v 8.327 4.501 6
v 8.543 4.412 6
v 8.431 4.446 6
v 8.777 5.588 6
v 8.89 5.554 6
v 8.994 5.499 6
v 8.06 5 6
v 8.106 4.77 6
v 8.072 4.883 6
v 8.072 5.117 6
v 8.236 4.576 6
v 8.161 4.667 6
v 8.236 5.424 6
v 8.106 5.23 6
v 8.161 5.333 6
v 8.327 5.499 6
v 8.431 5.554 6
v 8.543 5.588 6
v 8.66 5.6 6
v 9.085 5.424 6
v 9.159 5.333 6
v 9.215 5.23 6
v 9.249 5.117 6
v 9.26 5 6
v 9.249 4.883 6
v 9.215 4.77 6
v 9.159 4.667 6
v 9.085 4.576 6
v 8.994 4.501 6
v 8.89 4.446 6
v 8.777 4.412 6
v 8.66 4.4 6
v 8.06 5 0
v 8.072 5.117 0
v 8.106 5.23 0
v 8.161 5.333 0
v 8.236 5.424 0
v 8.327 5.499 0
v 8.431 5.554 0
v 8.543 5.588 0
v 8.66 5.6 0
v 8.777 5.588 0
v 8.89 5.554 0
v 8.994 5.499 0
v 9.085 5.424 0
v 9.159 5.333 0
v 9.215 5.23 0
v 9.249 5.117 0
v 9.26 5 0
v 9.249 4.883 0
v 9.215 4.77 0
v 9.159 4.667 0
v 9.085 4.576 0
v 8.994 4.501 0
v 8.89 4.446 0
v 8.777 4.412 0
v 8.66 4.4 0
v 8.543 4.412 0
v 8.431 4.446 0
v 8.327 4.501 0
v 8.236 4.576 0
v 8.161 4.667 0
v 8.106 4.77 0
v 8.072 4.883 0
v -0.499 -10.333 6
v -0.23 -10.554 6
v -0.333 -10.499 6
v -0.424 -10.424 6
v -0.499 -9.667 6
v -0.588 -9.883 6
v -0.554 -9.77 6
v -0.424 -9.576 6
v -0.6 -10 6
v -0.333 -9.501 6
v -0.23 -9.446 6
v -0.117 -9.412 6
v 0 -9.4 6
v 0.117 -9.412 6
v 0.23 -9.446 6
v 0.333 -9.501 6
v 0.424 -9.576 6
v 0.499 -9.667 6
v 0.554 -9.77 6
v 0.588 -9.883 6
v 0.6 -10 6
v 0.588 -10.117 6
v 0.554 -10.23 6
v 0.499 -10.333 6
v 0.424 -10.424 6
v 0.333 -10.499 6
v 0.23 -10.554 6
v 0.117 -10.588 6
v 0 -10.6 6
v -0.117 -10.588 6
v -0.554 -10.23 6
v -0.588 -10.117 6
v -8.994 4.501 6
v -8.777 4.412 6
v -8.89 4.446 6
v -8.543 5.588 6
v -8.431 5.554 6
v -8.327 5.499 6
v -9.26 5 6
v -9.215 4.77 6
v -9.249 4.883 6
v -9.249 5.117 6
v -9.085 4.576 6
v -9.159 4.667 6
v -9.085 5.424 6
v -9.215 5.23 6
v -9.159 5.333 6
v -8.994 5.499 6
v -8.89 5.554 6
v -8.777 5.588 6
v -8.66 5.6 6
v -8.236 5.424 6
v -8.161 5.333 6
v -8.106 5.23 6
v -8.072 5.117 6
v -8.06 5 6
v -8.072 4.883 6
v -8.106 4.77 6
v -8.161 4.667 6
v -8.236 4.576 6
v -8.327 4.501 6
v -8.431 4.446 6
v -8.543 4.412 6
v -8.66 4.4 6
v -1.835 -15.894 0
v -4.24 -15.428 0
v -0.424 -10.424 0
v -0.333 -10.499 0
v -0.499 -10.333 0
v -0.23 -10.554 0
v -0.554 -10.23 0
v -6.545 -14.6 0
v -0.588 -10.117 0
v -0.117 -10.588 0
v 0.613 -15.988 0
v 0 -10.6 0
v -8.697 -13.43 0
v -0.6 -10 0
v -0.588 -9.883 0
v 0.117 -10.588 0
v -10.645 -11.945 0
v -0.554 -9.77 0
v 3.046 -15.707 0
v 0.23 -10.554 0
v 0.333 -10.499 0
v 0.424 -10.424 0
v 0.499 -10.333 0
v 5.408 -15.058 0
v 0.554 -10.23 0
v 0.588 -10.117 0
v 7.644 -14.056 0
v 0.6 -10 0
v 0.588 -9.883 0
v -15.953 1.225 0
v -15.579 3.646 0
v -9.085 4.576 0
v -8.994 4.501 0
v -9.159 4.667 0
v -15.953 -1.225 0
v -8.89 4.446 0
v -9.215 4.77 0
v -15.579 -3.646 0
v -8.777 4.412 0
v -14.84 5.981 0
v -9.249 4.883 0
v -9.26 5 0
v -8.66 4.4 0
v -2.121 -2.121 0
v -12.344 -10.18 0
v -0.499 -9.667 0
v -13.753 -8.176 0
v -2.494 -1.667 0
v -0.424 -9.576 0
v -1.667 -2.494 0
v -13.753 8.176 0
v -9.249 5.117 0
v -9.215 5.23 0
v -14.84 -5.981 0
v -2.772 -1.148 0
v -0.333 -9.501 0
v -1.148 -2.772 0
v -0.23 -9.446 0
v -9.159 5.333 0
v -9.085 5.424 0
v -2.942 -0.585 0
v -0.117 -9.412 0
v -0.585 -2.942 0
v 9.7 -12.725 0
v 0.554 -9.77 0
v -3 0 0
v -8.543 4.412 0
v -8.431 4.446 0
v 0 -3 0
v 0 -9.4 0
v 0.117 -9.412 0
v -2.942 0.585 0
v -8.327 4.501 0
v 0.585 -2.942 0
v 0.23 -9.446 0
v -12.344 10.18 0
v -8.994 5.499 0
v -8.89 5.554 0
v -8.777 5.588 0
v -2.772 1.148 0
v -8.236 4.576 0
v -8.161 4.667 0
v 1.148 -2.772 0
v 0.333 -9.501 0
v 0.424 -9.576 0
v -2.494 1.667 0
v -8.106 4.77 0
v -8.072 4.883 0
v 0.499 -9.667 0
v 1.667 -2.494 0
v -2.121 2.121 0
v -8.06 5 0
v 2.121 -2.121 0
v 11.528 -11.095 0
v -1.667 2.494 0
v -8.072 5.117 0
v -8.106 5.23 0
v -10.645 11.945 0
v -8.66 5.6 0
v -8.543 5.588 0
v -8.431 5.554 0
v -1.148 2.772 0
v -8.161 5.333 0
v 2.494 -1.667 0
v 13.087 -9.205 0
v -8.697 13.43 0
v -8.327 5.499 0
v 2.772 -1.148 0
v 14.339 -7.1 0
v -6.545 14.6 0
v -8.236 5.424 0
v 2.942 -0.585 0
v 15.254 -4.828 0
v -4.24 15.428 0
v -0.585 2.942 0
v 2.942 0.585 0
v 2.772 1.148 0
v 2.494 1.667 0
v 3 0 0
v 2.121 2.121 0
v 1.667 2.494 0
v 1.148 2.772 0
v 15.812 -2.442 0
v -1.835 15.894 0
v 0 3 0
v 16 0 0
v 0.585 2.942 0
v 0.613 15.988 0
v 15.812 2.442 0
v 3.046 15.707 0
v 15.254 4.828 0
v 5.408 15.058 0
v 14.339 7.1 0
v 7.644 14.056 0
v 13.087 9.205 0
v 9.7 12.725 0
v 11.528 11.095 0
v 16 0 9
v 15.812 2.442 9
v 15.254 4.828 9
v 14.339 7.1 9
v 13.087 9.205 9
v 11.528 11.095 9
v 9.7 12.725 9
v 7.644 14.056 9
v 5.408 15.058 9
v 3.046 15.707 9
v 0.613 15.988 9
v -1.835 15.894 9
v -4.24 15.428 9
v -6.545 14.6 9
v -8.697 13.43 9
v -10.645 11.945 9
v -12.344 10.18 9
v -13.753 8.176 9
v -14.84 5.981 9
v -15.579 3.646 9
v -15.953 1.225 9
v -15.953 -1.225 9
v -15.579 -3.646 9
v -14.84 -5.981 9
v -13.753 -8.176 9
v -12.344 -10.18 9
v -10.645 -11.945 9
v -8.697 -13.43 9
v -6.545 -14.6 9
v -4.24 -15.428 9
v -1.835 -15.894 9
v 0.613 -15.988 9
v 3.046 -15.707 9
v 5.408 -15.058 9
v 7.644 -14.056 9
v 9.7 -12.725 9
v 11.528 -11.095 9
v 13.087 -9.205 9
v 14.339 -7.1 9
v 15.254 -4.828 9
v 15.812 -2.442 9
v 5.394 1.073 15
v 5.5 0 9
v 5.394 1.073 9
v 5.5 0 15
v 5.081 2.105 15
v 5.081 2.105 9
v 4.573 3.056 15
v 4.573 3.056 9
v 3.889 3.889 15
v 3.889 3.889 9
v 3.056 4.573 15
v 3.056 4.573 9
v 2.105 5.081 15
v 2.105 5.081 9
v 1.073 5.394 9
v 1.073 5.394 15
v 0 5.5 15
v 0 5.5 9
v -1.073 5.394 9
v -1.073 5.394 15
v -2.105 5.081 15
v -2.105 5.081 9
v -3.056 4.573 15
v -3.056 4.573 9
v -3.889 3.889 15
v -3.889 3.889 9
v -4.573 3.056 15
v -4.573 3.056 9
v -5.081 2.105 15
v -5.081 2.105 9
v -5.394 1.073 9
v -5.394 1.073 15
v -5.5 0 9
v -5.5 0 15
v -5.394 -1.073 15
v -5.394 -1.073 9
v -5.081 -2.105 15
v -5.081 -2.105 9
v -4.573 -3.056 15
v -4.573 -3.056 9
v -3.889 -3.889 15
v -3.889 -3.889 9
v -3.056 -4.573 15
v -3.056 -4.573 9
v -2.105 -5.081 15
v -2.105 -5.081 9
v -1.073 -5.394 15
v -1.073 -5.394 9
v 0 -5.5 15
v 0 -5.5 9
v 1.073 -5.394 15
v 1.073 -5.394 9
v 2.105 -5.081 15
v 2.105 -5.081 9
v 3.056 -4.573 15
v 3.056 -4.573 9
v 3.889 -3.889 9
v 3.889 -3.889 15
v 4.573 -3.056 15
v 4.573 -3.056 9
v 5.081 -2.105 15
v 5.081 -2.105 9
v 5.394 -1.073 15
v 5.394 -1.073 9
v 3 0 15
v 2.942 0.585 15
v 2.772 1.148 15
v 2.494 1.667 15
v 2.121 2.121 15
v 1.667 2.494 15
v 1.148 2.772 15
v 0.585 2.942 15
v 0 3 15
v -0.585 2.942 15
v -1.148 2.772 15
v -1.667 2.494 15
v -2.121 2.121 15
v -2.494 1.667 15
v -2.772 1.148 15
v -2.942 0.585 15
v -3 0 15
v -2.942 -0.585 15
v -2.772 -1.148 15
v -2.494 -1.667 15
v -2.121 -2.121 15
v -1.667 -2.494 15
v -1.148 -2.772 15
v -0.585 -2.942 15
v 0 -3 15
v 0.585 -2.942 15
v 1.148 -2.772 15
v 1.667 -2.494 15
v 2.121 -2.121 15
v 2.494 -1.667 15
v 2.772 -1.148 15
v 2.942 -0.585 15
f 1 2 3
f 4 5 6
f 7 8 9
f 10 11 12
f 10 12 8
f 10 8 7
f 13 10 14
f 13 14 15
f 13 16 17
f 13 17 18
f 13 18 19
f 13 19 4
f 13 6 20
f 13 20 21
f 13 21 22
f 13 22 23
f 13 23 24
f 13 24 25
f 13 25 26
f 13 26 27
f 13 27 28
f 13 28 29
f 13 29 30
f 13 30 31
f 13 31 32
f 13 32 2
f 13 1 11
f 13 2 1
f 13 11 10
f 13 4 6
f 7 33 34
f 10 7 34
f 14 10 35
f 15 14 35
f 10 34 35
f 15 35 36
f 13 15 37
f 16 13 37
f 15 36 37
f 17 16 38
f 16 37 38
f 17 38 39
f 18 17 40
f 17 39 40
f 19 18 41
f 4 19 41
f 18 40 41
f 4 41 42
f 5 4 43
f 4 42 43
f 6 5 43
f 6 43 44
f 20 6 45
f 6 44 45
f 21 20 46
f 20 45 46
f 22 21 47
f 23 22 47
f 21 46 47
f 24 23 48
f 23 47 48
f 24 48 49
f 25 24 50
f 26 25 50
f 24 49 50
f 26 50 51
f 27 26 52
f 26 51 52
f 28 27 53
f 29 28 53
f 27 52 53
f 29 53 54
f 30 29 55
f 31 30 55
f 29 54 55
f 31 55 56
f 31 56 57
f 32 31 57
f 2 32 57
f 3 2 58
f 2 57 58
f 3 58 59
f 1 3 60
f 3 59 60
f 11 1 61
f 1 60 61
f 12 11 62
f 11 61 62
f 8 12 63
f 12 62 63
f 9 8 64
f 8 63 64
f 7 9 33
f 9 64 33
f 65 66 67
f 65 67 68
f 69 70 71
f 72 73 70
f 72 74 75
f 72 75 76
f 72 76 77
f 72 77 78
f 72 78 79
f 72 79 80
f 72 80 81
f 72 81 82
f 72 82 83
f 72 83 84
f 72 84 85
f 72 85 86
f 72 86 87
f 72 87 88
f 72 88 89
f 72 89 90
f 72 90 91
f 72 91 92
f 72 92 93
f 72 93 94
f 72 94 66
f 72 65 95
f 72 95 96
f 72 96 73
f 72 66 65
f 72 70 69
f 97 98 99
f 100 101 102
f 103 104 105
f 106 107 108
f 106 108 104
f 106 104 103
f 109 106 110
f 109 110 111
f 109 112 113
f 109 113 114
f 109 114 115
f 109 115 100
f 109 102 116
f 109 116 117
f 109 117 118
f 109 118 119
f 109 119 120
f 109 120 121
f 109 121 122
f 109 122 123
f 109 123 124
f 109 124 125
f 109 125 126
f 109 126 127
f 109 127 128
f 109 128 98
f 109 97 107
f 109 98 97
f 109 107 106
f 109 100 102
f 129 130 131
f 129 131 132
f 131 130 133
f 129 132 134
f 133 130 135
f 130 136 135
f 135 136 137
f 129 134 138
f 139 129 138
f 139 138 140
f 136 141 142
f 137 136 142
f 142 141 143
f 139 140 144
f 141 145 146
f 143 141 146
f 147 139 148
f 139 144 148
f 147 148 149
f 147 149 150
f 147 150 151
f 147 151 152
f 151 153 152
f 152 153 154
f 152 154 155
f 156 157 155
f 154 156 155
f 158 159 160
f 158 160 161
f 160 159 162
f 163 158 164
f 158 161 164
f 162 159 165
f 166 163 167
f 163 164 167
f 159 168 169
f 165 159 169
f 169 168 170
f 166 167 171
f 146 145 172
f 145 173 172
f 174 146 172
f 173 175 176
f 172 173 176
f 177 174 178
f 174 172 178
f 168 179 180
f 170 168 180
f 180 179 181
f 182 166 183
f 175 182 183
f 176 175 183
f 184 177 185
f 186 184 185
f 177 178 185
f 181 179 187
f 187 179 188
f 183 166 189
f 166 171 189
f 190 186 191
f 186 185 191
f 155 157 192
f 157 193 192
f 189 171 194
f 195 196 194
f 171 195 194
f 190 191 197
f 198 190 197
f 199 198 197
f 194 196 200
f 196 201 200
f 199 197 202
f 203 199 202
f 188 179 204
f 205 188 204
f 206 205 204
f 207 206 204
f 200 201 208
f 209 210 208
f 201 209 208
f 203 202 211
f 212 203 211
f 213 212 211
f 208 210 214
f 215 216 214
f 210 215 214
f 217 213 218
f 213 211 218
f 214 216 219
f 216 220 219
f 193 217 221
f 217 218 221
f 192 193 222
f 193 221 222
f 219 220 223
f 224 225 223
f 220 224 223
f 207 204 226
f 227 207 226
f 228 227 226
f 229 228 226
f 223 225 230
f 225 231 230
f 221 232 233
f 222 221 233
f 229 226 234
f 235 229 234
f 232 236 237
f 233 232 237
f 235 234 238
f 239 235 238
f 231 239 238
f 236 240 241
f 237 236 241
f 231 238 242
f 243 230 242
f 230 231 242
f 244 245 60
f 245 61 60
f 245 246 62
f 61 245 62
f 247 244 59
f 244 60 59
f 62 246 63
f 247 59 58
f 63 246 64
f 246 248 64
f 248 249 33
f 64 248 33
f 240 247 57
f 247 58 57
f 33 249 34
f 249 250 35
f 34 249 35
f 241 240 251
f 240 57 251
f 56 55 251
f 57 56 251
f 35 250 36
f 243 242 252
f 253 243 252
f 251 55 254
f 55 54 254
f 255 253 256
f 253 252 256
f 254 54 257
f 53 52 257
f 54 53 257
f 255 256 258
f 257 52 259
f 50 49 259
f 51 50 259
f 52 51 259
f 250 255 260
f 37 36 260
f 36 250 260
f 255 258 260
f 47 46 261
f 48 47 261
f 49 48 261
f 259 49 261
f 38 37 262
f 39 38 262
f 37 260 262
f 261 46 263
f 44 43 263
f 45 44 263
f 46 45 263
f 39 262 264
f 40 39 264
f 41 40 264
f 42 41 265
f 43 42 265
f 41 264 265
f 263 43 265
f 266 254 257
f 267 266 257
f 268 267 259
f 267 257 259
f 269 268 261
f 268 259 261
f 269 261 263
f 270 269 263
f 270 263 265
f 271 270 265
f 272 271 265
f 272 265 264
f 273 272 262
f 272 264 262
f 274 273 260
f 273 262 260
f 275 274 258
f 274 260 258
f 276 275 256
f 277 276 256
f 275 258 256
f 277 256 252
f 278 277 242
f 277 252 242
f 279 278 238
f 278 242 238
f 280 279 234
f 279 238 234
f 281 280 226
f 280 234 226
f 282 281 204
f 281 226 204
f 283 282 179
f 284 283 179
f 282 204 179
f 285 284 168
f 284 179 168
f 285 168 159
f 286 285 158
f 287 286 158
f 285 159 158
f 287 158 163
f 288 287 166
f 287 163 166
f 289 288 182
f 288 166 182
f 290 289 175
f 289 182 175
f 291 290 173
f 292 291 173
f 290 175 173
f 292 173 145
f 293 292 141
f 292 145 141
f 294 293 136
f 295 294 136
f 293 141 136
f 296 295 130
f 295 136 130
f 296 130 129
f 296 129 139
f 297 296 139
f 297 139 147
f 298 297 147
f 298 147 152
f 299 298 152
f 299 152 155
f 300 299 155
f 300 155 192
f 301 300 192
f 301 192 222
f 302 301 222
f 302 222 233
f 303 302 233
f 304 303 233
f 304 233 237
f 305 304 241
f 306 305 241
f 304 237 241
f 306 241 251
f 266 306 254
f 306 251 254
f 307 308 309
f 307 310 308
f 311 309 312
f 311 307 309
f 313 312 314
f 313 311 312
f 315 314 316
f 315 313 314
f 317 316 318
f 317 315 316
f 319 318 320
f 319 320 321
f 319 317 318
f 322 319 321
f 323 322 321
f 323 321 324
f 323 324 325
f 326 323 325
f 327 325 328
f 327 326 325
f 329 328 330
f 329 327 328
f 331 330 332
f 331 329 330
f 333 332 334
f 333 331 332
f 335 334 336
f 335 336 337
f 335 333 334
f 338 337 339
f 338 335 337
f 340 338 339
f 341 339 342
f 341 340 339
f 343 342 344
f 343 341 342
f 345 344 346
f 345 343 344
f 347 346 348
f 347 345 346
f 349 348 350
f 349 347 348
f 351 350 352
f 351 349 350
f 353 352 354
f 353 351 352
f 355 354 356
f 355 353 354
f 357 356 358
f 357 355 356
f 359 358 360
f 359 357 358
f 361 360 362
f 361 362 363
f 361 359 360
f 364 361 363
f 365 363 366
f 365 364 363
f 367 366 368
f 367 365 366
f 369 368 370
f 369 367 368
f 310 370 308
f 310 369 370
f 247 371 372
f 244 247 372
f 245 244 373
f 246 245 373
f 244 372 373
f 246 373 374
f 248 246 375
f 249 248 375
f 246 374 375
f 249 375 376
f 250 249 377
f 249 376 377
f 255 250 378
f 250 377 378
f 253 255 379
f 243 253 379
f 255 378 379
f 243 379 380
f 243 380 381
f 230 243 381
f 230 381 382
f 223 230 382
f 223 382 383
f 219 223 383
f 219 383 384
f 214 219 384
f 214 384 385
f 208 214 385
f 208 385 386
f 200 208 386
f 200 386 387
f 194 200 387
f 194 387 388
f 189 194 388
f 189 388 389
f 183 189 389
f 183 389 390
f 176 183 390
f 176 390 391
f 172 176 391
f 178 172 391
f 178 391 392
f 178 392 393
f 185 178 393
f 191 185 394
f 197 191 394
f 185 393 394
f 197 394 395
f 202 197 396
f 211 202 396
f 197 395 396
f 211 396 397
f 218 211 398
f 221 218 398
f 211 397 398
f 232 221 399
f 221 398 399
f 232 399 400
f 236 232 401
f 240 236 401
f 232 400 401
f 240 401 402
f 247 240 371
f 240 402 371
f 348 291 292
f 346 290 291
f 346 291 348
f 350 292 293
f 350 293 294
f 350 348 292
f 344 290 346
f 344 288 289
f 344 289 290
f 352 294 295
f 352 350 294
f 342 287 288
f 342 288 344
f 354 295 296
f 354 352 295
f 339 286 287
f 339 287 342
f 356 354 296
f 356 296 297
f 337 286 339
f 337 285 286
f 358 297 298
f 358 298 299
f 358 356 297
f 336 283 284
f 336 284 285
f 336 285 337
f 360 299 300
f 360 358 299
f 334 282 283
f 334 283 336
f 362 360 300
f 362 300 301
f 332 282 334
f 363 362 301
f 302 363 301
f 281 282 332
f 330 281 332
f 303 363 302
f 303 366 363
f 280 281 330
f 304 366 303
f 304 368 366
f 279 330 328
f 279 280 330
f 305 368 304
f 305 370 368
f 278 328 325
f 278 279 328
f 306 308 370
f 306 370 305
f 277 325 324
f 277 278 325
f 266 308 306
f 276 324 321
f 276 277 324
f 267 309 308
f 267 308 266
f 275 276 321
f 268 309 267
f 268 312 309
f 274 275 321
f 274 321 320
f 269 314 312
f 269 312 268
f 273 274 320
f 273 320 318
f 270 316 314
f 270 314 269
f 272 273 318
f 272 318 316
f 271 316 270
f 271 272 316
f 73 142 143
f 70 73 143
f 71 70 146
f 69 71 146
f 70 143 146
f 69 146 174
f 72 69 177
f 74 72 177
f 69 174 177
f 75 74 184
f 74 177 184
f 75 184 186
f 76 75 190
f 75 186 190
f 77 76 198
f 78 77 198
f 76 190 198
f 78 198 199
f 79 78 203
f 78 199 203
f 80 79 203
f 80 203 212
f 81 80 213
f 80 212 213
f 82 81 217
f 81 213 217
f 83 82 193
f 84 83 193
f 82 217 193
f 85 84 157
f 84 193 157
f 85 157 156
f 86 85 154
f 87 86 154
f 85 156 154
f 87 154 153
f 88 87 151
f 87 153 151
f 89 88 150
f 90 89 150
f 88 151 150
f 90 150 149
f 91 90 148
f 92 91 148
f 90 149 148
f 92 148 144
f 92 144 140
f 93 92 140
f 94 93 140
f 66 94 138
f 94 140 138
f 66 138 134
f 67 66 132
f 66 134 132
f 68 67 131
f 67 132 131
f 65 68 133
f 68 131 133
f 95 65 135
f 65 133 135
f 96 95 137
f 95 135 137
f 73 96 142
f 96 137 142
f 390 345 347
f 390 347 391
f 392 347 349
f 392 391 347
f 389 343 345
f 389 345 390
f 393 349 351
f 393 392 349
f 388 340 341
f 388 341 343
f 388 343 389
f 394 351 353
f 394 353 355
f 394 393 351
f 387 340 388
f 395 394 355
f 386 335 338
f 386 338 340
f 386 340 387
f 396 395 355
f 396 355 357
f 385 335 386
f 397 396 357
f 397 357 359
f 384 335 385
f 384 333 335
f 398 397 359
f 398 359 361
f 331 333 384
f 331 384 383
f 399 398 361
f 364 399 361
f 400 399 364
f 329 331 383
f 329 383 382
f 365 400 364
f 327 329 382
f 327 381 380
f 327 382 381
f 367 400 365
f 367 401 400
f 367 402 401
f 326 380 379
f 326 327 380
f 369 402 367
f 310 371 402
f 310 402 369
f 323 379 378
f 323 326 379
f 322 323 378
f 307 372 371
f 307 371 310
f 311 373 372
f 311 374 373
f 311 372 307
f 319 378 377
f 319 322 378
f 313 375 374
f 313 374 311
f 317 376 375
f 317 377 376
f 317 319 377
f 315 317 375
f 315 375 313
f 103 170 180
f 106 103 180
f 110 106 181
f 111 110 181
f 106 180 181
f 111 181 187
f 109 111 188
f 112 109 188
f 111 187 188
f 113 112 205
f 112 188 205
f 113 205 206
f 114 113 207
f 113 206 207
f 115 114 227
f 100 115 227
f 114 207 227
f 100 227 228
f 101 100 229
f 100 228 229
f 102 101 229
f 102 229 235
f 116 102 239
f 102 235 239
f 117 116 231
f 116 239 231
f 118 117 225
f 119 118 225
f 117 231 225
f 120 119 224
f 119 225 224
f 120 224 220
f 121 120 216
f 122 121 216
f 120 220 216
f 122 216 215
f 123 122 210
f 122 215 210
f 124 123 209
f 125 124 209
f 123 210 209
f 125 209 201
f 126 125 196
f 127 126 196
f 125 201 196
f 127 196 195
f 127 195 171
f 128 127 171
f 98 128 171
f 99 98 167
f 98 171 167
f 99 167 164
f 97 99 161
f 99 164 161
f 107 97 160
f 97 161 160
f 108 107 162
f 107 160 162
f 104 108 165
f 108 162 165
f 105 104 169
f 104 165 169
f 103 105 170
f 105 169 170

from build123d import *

# Parameters (mm, degrees)
SKETCH_1_R          = 16
EXTRUDE_1_DEPTH     = 9
SKETCH_2_R          = 6
EXTRUDE_2_DEPTH     = 0.5
SKETCH_3_R          = 16
EXTRUDE_3_DEPTH     = 3.25
SKETCH_4_R          = 5.5
EXTRUDE_4_DEPTH     = 2.25
SKETCH_5_R          = 3
CUT_EXTRUDE_1_DEPTH = 26.25
SKETCH_6_R          = 8
SKETCH_6_R_2        = 5.5
CUT_EXTRUDE_2_DEPTH = 2.25
SKETCH_7_R          = 0.6
CUT_EXTRUDE_3_DEPTH = 6
SKETCH_8_R          = 0.6
CUT_EXTRUDE_4_DEPTH = 3
SKETCH_9_R          = 18.290801542
SKETCH_9_R_2        = 5.5
CUT_EXTRUDE_5_DEPTH = 3.75


with BuildPart() as part:
    # 草图1 → 凸台-拉伸1 (new body)
    with BuildSketch(Plane.XY):
        Circle(SKETCH_1_R)
    extrude(amount=EXTRUDE_1_DEPTH)

    # 草图2 → 凸台-拉伸2 (add)
    with BuildSketch(Plane.XY.offset(9)):
        Circle(SKETCH_2_R)
    extrude(amount=EXTRUDE_2_DEPTH)

    # 草图3 → 凸台-拉伸3 (add)
    with BuildSketch(Plane.XY.offset(9.5)):
        Circle(SKETCH_3_R)
    extrude(amount=EXTRUDE_3_DEPTH)

    # 草图4 → 凸台-拉伸4 (add)
    with BuildSketch(Plane.XY.offset(12.75)):
        Circle(SKETCH_4_R)
    extrude(amount=EXTRUDE_4_DEPTH)

    # 草图5 → 切除-拉伸1 (cut)
    with BuildSketch(Plane.XY.offset(15)):
        Circle(SKETCH_5_R)
    extrude(amount=-CUT_EXTRUDE_1_DEPTH, mode=Mode.SUBTRACT)

    # 草图6 → 切除-拉伸2 (cut)
    with BuildSketch(Plane.XY.offset(12.75)):
        Circle(SKETCH_6_R)
        Circle(SKETCH_6_R_2, mode=Mode.SUBTRACT)
    extrude(amount=-CUT_EXTRUDE_2_DEPTH, mode=Mode.SUBTRACT)

    # 草图7 → 切除-拉伸3 (cut)
    with BuildSketch(Plane(origin=(0, 0, 0), x_dir=(-1, 0, 0), z_dir=(0, 0, -1))):
        with Locations((8.660254038, 5)):
            Circle(SKETCH_7_R)
        with Locations((-8.660254038, 5)):
            Circle(SKETCH_7_R)
        with Locations((0, -10)):
            Circle(SKETCH_7_R)
    extrude(amount=-CUT_EXTRUDE_3_DEPTH, mode=Mode.SUBTRACT)

    # 草图8 → 切除-拉伸4 (cut)
    with BuildSketch(Plane.XY.offset(12.75)):
        with Locations((5, -8.660254038)):
            Circle(SKETCH_8_R)
        with Locations((5, 8.660254038)):
            Circle(SKETCH_8_R)
        with Locations((-10, 0)):
            Circle(SKETCH_8_R)
    extrude(amount=-CUT_EXTRUDE_4_DEPTH, mode=Mode.SUBTRACT)

    # 草图9 → 切除-拉伸5 (cut)
    with BuildSketch(Plane.XY.offset(12.75)):
        Circle(SKETCH_9_R)
        Circle(SKETCH_9_R_2, mode=Mode.SUBTRACT)
    extrude(amount=-CUT_EXTRUDE_5_DEPTH, mode=Mode.SUBTRACT)


solid = part.part
